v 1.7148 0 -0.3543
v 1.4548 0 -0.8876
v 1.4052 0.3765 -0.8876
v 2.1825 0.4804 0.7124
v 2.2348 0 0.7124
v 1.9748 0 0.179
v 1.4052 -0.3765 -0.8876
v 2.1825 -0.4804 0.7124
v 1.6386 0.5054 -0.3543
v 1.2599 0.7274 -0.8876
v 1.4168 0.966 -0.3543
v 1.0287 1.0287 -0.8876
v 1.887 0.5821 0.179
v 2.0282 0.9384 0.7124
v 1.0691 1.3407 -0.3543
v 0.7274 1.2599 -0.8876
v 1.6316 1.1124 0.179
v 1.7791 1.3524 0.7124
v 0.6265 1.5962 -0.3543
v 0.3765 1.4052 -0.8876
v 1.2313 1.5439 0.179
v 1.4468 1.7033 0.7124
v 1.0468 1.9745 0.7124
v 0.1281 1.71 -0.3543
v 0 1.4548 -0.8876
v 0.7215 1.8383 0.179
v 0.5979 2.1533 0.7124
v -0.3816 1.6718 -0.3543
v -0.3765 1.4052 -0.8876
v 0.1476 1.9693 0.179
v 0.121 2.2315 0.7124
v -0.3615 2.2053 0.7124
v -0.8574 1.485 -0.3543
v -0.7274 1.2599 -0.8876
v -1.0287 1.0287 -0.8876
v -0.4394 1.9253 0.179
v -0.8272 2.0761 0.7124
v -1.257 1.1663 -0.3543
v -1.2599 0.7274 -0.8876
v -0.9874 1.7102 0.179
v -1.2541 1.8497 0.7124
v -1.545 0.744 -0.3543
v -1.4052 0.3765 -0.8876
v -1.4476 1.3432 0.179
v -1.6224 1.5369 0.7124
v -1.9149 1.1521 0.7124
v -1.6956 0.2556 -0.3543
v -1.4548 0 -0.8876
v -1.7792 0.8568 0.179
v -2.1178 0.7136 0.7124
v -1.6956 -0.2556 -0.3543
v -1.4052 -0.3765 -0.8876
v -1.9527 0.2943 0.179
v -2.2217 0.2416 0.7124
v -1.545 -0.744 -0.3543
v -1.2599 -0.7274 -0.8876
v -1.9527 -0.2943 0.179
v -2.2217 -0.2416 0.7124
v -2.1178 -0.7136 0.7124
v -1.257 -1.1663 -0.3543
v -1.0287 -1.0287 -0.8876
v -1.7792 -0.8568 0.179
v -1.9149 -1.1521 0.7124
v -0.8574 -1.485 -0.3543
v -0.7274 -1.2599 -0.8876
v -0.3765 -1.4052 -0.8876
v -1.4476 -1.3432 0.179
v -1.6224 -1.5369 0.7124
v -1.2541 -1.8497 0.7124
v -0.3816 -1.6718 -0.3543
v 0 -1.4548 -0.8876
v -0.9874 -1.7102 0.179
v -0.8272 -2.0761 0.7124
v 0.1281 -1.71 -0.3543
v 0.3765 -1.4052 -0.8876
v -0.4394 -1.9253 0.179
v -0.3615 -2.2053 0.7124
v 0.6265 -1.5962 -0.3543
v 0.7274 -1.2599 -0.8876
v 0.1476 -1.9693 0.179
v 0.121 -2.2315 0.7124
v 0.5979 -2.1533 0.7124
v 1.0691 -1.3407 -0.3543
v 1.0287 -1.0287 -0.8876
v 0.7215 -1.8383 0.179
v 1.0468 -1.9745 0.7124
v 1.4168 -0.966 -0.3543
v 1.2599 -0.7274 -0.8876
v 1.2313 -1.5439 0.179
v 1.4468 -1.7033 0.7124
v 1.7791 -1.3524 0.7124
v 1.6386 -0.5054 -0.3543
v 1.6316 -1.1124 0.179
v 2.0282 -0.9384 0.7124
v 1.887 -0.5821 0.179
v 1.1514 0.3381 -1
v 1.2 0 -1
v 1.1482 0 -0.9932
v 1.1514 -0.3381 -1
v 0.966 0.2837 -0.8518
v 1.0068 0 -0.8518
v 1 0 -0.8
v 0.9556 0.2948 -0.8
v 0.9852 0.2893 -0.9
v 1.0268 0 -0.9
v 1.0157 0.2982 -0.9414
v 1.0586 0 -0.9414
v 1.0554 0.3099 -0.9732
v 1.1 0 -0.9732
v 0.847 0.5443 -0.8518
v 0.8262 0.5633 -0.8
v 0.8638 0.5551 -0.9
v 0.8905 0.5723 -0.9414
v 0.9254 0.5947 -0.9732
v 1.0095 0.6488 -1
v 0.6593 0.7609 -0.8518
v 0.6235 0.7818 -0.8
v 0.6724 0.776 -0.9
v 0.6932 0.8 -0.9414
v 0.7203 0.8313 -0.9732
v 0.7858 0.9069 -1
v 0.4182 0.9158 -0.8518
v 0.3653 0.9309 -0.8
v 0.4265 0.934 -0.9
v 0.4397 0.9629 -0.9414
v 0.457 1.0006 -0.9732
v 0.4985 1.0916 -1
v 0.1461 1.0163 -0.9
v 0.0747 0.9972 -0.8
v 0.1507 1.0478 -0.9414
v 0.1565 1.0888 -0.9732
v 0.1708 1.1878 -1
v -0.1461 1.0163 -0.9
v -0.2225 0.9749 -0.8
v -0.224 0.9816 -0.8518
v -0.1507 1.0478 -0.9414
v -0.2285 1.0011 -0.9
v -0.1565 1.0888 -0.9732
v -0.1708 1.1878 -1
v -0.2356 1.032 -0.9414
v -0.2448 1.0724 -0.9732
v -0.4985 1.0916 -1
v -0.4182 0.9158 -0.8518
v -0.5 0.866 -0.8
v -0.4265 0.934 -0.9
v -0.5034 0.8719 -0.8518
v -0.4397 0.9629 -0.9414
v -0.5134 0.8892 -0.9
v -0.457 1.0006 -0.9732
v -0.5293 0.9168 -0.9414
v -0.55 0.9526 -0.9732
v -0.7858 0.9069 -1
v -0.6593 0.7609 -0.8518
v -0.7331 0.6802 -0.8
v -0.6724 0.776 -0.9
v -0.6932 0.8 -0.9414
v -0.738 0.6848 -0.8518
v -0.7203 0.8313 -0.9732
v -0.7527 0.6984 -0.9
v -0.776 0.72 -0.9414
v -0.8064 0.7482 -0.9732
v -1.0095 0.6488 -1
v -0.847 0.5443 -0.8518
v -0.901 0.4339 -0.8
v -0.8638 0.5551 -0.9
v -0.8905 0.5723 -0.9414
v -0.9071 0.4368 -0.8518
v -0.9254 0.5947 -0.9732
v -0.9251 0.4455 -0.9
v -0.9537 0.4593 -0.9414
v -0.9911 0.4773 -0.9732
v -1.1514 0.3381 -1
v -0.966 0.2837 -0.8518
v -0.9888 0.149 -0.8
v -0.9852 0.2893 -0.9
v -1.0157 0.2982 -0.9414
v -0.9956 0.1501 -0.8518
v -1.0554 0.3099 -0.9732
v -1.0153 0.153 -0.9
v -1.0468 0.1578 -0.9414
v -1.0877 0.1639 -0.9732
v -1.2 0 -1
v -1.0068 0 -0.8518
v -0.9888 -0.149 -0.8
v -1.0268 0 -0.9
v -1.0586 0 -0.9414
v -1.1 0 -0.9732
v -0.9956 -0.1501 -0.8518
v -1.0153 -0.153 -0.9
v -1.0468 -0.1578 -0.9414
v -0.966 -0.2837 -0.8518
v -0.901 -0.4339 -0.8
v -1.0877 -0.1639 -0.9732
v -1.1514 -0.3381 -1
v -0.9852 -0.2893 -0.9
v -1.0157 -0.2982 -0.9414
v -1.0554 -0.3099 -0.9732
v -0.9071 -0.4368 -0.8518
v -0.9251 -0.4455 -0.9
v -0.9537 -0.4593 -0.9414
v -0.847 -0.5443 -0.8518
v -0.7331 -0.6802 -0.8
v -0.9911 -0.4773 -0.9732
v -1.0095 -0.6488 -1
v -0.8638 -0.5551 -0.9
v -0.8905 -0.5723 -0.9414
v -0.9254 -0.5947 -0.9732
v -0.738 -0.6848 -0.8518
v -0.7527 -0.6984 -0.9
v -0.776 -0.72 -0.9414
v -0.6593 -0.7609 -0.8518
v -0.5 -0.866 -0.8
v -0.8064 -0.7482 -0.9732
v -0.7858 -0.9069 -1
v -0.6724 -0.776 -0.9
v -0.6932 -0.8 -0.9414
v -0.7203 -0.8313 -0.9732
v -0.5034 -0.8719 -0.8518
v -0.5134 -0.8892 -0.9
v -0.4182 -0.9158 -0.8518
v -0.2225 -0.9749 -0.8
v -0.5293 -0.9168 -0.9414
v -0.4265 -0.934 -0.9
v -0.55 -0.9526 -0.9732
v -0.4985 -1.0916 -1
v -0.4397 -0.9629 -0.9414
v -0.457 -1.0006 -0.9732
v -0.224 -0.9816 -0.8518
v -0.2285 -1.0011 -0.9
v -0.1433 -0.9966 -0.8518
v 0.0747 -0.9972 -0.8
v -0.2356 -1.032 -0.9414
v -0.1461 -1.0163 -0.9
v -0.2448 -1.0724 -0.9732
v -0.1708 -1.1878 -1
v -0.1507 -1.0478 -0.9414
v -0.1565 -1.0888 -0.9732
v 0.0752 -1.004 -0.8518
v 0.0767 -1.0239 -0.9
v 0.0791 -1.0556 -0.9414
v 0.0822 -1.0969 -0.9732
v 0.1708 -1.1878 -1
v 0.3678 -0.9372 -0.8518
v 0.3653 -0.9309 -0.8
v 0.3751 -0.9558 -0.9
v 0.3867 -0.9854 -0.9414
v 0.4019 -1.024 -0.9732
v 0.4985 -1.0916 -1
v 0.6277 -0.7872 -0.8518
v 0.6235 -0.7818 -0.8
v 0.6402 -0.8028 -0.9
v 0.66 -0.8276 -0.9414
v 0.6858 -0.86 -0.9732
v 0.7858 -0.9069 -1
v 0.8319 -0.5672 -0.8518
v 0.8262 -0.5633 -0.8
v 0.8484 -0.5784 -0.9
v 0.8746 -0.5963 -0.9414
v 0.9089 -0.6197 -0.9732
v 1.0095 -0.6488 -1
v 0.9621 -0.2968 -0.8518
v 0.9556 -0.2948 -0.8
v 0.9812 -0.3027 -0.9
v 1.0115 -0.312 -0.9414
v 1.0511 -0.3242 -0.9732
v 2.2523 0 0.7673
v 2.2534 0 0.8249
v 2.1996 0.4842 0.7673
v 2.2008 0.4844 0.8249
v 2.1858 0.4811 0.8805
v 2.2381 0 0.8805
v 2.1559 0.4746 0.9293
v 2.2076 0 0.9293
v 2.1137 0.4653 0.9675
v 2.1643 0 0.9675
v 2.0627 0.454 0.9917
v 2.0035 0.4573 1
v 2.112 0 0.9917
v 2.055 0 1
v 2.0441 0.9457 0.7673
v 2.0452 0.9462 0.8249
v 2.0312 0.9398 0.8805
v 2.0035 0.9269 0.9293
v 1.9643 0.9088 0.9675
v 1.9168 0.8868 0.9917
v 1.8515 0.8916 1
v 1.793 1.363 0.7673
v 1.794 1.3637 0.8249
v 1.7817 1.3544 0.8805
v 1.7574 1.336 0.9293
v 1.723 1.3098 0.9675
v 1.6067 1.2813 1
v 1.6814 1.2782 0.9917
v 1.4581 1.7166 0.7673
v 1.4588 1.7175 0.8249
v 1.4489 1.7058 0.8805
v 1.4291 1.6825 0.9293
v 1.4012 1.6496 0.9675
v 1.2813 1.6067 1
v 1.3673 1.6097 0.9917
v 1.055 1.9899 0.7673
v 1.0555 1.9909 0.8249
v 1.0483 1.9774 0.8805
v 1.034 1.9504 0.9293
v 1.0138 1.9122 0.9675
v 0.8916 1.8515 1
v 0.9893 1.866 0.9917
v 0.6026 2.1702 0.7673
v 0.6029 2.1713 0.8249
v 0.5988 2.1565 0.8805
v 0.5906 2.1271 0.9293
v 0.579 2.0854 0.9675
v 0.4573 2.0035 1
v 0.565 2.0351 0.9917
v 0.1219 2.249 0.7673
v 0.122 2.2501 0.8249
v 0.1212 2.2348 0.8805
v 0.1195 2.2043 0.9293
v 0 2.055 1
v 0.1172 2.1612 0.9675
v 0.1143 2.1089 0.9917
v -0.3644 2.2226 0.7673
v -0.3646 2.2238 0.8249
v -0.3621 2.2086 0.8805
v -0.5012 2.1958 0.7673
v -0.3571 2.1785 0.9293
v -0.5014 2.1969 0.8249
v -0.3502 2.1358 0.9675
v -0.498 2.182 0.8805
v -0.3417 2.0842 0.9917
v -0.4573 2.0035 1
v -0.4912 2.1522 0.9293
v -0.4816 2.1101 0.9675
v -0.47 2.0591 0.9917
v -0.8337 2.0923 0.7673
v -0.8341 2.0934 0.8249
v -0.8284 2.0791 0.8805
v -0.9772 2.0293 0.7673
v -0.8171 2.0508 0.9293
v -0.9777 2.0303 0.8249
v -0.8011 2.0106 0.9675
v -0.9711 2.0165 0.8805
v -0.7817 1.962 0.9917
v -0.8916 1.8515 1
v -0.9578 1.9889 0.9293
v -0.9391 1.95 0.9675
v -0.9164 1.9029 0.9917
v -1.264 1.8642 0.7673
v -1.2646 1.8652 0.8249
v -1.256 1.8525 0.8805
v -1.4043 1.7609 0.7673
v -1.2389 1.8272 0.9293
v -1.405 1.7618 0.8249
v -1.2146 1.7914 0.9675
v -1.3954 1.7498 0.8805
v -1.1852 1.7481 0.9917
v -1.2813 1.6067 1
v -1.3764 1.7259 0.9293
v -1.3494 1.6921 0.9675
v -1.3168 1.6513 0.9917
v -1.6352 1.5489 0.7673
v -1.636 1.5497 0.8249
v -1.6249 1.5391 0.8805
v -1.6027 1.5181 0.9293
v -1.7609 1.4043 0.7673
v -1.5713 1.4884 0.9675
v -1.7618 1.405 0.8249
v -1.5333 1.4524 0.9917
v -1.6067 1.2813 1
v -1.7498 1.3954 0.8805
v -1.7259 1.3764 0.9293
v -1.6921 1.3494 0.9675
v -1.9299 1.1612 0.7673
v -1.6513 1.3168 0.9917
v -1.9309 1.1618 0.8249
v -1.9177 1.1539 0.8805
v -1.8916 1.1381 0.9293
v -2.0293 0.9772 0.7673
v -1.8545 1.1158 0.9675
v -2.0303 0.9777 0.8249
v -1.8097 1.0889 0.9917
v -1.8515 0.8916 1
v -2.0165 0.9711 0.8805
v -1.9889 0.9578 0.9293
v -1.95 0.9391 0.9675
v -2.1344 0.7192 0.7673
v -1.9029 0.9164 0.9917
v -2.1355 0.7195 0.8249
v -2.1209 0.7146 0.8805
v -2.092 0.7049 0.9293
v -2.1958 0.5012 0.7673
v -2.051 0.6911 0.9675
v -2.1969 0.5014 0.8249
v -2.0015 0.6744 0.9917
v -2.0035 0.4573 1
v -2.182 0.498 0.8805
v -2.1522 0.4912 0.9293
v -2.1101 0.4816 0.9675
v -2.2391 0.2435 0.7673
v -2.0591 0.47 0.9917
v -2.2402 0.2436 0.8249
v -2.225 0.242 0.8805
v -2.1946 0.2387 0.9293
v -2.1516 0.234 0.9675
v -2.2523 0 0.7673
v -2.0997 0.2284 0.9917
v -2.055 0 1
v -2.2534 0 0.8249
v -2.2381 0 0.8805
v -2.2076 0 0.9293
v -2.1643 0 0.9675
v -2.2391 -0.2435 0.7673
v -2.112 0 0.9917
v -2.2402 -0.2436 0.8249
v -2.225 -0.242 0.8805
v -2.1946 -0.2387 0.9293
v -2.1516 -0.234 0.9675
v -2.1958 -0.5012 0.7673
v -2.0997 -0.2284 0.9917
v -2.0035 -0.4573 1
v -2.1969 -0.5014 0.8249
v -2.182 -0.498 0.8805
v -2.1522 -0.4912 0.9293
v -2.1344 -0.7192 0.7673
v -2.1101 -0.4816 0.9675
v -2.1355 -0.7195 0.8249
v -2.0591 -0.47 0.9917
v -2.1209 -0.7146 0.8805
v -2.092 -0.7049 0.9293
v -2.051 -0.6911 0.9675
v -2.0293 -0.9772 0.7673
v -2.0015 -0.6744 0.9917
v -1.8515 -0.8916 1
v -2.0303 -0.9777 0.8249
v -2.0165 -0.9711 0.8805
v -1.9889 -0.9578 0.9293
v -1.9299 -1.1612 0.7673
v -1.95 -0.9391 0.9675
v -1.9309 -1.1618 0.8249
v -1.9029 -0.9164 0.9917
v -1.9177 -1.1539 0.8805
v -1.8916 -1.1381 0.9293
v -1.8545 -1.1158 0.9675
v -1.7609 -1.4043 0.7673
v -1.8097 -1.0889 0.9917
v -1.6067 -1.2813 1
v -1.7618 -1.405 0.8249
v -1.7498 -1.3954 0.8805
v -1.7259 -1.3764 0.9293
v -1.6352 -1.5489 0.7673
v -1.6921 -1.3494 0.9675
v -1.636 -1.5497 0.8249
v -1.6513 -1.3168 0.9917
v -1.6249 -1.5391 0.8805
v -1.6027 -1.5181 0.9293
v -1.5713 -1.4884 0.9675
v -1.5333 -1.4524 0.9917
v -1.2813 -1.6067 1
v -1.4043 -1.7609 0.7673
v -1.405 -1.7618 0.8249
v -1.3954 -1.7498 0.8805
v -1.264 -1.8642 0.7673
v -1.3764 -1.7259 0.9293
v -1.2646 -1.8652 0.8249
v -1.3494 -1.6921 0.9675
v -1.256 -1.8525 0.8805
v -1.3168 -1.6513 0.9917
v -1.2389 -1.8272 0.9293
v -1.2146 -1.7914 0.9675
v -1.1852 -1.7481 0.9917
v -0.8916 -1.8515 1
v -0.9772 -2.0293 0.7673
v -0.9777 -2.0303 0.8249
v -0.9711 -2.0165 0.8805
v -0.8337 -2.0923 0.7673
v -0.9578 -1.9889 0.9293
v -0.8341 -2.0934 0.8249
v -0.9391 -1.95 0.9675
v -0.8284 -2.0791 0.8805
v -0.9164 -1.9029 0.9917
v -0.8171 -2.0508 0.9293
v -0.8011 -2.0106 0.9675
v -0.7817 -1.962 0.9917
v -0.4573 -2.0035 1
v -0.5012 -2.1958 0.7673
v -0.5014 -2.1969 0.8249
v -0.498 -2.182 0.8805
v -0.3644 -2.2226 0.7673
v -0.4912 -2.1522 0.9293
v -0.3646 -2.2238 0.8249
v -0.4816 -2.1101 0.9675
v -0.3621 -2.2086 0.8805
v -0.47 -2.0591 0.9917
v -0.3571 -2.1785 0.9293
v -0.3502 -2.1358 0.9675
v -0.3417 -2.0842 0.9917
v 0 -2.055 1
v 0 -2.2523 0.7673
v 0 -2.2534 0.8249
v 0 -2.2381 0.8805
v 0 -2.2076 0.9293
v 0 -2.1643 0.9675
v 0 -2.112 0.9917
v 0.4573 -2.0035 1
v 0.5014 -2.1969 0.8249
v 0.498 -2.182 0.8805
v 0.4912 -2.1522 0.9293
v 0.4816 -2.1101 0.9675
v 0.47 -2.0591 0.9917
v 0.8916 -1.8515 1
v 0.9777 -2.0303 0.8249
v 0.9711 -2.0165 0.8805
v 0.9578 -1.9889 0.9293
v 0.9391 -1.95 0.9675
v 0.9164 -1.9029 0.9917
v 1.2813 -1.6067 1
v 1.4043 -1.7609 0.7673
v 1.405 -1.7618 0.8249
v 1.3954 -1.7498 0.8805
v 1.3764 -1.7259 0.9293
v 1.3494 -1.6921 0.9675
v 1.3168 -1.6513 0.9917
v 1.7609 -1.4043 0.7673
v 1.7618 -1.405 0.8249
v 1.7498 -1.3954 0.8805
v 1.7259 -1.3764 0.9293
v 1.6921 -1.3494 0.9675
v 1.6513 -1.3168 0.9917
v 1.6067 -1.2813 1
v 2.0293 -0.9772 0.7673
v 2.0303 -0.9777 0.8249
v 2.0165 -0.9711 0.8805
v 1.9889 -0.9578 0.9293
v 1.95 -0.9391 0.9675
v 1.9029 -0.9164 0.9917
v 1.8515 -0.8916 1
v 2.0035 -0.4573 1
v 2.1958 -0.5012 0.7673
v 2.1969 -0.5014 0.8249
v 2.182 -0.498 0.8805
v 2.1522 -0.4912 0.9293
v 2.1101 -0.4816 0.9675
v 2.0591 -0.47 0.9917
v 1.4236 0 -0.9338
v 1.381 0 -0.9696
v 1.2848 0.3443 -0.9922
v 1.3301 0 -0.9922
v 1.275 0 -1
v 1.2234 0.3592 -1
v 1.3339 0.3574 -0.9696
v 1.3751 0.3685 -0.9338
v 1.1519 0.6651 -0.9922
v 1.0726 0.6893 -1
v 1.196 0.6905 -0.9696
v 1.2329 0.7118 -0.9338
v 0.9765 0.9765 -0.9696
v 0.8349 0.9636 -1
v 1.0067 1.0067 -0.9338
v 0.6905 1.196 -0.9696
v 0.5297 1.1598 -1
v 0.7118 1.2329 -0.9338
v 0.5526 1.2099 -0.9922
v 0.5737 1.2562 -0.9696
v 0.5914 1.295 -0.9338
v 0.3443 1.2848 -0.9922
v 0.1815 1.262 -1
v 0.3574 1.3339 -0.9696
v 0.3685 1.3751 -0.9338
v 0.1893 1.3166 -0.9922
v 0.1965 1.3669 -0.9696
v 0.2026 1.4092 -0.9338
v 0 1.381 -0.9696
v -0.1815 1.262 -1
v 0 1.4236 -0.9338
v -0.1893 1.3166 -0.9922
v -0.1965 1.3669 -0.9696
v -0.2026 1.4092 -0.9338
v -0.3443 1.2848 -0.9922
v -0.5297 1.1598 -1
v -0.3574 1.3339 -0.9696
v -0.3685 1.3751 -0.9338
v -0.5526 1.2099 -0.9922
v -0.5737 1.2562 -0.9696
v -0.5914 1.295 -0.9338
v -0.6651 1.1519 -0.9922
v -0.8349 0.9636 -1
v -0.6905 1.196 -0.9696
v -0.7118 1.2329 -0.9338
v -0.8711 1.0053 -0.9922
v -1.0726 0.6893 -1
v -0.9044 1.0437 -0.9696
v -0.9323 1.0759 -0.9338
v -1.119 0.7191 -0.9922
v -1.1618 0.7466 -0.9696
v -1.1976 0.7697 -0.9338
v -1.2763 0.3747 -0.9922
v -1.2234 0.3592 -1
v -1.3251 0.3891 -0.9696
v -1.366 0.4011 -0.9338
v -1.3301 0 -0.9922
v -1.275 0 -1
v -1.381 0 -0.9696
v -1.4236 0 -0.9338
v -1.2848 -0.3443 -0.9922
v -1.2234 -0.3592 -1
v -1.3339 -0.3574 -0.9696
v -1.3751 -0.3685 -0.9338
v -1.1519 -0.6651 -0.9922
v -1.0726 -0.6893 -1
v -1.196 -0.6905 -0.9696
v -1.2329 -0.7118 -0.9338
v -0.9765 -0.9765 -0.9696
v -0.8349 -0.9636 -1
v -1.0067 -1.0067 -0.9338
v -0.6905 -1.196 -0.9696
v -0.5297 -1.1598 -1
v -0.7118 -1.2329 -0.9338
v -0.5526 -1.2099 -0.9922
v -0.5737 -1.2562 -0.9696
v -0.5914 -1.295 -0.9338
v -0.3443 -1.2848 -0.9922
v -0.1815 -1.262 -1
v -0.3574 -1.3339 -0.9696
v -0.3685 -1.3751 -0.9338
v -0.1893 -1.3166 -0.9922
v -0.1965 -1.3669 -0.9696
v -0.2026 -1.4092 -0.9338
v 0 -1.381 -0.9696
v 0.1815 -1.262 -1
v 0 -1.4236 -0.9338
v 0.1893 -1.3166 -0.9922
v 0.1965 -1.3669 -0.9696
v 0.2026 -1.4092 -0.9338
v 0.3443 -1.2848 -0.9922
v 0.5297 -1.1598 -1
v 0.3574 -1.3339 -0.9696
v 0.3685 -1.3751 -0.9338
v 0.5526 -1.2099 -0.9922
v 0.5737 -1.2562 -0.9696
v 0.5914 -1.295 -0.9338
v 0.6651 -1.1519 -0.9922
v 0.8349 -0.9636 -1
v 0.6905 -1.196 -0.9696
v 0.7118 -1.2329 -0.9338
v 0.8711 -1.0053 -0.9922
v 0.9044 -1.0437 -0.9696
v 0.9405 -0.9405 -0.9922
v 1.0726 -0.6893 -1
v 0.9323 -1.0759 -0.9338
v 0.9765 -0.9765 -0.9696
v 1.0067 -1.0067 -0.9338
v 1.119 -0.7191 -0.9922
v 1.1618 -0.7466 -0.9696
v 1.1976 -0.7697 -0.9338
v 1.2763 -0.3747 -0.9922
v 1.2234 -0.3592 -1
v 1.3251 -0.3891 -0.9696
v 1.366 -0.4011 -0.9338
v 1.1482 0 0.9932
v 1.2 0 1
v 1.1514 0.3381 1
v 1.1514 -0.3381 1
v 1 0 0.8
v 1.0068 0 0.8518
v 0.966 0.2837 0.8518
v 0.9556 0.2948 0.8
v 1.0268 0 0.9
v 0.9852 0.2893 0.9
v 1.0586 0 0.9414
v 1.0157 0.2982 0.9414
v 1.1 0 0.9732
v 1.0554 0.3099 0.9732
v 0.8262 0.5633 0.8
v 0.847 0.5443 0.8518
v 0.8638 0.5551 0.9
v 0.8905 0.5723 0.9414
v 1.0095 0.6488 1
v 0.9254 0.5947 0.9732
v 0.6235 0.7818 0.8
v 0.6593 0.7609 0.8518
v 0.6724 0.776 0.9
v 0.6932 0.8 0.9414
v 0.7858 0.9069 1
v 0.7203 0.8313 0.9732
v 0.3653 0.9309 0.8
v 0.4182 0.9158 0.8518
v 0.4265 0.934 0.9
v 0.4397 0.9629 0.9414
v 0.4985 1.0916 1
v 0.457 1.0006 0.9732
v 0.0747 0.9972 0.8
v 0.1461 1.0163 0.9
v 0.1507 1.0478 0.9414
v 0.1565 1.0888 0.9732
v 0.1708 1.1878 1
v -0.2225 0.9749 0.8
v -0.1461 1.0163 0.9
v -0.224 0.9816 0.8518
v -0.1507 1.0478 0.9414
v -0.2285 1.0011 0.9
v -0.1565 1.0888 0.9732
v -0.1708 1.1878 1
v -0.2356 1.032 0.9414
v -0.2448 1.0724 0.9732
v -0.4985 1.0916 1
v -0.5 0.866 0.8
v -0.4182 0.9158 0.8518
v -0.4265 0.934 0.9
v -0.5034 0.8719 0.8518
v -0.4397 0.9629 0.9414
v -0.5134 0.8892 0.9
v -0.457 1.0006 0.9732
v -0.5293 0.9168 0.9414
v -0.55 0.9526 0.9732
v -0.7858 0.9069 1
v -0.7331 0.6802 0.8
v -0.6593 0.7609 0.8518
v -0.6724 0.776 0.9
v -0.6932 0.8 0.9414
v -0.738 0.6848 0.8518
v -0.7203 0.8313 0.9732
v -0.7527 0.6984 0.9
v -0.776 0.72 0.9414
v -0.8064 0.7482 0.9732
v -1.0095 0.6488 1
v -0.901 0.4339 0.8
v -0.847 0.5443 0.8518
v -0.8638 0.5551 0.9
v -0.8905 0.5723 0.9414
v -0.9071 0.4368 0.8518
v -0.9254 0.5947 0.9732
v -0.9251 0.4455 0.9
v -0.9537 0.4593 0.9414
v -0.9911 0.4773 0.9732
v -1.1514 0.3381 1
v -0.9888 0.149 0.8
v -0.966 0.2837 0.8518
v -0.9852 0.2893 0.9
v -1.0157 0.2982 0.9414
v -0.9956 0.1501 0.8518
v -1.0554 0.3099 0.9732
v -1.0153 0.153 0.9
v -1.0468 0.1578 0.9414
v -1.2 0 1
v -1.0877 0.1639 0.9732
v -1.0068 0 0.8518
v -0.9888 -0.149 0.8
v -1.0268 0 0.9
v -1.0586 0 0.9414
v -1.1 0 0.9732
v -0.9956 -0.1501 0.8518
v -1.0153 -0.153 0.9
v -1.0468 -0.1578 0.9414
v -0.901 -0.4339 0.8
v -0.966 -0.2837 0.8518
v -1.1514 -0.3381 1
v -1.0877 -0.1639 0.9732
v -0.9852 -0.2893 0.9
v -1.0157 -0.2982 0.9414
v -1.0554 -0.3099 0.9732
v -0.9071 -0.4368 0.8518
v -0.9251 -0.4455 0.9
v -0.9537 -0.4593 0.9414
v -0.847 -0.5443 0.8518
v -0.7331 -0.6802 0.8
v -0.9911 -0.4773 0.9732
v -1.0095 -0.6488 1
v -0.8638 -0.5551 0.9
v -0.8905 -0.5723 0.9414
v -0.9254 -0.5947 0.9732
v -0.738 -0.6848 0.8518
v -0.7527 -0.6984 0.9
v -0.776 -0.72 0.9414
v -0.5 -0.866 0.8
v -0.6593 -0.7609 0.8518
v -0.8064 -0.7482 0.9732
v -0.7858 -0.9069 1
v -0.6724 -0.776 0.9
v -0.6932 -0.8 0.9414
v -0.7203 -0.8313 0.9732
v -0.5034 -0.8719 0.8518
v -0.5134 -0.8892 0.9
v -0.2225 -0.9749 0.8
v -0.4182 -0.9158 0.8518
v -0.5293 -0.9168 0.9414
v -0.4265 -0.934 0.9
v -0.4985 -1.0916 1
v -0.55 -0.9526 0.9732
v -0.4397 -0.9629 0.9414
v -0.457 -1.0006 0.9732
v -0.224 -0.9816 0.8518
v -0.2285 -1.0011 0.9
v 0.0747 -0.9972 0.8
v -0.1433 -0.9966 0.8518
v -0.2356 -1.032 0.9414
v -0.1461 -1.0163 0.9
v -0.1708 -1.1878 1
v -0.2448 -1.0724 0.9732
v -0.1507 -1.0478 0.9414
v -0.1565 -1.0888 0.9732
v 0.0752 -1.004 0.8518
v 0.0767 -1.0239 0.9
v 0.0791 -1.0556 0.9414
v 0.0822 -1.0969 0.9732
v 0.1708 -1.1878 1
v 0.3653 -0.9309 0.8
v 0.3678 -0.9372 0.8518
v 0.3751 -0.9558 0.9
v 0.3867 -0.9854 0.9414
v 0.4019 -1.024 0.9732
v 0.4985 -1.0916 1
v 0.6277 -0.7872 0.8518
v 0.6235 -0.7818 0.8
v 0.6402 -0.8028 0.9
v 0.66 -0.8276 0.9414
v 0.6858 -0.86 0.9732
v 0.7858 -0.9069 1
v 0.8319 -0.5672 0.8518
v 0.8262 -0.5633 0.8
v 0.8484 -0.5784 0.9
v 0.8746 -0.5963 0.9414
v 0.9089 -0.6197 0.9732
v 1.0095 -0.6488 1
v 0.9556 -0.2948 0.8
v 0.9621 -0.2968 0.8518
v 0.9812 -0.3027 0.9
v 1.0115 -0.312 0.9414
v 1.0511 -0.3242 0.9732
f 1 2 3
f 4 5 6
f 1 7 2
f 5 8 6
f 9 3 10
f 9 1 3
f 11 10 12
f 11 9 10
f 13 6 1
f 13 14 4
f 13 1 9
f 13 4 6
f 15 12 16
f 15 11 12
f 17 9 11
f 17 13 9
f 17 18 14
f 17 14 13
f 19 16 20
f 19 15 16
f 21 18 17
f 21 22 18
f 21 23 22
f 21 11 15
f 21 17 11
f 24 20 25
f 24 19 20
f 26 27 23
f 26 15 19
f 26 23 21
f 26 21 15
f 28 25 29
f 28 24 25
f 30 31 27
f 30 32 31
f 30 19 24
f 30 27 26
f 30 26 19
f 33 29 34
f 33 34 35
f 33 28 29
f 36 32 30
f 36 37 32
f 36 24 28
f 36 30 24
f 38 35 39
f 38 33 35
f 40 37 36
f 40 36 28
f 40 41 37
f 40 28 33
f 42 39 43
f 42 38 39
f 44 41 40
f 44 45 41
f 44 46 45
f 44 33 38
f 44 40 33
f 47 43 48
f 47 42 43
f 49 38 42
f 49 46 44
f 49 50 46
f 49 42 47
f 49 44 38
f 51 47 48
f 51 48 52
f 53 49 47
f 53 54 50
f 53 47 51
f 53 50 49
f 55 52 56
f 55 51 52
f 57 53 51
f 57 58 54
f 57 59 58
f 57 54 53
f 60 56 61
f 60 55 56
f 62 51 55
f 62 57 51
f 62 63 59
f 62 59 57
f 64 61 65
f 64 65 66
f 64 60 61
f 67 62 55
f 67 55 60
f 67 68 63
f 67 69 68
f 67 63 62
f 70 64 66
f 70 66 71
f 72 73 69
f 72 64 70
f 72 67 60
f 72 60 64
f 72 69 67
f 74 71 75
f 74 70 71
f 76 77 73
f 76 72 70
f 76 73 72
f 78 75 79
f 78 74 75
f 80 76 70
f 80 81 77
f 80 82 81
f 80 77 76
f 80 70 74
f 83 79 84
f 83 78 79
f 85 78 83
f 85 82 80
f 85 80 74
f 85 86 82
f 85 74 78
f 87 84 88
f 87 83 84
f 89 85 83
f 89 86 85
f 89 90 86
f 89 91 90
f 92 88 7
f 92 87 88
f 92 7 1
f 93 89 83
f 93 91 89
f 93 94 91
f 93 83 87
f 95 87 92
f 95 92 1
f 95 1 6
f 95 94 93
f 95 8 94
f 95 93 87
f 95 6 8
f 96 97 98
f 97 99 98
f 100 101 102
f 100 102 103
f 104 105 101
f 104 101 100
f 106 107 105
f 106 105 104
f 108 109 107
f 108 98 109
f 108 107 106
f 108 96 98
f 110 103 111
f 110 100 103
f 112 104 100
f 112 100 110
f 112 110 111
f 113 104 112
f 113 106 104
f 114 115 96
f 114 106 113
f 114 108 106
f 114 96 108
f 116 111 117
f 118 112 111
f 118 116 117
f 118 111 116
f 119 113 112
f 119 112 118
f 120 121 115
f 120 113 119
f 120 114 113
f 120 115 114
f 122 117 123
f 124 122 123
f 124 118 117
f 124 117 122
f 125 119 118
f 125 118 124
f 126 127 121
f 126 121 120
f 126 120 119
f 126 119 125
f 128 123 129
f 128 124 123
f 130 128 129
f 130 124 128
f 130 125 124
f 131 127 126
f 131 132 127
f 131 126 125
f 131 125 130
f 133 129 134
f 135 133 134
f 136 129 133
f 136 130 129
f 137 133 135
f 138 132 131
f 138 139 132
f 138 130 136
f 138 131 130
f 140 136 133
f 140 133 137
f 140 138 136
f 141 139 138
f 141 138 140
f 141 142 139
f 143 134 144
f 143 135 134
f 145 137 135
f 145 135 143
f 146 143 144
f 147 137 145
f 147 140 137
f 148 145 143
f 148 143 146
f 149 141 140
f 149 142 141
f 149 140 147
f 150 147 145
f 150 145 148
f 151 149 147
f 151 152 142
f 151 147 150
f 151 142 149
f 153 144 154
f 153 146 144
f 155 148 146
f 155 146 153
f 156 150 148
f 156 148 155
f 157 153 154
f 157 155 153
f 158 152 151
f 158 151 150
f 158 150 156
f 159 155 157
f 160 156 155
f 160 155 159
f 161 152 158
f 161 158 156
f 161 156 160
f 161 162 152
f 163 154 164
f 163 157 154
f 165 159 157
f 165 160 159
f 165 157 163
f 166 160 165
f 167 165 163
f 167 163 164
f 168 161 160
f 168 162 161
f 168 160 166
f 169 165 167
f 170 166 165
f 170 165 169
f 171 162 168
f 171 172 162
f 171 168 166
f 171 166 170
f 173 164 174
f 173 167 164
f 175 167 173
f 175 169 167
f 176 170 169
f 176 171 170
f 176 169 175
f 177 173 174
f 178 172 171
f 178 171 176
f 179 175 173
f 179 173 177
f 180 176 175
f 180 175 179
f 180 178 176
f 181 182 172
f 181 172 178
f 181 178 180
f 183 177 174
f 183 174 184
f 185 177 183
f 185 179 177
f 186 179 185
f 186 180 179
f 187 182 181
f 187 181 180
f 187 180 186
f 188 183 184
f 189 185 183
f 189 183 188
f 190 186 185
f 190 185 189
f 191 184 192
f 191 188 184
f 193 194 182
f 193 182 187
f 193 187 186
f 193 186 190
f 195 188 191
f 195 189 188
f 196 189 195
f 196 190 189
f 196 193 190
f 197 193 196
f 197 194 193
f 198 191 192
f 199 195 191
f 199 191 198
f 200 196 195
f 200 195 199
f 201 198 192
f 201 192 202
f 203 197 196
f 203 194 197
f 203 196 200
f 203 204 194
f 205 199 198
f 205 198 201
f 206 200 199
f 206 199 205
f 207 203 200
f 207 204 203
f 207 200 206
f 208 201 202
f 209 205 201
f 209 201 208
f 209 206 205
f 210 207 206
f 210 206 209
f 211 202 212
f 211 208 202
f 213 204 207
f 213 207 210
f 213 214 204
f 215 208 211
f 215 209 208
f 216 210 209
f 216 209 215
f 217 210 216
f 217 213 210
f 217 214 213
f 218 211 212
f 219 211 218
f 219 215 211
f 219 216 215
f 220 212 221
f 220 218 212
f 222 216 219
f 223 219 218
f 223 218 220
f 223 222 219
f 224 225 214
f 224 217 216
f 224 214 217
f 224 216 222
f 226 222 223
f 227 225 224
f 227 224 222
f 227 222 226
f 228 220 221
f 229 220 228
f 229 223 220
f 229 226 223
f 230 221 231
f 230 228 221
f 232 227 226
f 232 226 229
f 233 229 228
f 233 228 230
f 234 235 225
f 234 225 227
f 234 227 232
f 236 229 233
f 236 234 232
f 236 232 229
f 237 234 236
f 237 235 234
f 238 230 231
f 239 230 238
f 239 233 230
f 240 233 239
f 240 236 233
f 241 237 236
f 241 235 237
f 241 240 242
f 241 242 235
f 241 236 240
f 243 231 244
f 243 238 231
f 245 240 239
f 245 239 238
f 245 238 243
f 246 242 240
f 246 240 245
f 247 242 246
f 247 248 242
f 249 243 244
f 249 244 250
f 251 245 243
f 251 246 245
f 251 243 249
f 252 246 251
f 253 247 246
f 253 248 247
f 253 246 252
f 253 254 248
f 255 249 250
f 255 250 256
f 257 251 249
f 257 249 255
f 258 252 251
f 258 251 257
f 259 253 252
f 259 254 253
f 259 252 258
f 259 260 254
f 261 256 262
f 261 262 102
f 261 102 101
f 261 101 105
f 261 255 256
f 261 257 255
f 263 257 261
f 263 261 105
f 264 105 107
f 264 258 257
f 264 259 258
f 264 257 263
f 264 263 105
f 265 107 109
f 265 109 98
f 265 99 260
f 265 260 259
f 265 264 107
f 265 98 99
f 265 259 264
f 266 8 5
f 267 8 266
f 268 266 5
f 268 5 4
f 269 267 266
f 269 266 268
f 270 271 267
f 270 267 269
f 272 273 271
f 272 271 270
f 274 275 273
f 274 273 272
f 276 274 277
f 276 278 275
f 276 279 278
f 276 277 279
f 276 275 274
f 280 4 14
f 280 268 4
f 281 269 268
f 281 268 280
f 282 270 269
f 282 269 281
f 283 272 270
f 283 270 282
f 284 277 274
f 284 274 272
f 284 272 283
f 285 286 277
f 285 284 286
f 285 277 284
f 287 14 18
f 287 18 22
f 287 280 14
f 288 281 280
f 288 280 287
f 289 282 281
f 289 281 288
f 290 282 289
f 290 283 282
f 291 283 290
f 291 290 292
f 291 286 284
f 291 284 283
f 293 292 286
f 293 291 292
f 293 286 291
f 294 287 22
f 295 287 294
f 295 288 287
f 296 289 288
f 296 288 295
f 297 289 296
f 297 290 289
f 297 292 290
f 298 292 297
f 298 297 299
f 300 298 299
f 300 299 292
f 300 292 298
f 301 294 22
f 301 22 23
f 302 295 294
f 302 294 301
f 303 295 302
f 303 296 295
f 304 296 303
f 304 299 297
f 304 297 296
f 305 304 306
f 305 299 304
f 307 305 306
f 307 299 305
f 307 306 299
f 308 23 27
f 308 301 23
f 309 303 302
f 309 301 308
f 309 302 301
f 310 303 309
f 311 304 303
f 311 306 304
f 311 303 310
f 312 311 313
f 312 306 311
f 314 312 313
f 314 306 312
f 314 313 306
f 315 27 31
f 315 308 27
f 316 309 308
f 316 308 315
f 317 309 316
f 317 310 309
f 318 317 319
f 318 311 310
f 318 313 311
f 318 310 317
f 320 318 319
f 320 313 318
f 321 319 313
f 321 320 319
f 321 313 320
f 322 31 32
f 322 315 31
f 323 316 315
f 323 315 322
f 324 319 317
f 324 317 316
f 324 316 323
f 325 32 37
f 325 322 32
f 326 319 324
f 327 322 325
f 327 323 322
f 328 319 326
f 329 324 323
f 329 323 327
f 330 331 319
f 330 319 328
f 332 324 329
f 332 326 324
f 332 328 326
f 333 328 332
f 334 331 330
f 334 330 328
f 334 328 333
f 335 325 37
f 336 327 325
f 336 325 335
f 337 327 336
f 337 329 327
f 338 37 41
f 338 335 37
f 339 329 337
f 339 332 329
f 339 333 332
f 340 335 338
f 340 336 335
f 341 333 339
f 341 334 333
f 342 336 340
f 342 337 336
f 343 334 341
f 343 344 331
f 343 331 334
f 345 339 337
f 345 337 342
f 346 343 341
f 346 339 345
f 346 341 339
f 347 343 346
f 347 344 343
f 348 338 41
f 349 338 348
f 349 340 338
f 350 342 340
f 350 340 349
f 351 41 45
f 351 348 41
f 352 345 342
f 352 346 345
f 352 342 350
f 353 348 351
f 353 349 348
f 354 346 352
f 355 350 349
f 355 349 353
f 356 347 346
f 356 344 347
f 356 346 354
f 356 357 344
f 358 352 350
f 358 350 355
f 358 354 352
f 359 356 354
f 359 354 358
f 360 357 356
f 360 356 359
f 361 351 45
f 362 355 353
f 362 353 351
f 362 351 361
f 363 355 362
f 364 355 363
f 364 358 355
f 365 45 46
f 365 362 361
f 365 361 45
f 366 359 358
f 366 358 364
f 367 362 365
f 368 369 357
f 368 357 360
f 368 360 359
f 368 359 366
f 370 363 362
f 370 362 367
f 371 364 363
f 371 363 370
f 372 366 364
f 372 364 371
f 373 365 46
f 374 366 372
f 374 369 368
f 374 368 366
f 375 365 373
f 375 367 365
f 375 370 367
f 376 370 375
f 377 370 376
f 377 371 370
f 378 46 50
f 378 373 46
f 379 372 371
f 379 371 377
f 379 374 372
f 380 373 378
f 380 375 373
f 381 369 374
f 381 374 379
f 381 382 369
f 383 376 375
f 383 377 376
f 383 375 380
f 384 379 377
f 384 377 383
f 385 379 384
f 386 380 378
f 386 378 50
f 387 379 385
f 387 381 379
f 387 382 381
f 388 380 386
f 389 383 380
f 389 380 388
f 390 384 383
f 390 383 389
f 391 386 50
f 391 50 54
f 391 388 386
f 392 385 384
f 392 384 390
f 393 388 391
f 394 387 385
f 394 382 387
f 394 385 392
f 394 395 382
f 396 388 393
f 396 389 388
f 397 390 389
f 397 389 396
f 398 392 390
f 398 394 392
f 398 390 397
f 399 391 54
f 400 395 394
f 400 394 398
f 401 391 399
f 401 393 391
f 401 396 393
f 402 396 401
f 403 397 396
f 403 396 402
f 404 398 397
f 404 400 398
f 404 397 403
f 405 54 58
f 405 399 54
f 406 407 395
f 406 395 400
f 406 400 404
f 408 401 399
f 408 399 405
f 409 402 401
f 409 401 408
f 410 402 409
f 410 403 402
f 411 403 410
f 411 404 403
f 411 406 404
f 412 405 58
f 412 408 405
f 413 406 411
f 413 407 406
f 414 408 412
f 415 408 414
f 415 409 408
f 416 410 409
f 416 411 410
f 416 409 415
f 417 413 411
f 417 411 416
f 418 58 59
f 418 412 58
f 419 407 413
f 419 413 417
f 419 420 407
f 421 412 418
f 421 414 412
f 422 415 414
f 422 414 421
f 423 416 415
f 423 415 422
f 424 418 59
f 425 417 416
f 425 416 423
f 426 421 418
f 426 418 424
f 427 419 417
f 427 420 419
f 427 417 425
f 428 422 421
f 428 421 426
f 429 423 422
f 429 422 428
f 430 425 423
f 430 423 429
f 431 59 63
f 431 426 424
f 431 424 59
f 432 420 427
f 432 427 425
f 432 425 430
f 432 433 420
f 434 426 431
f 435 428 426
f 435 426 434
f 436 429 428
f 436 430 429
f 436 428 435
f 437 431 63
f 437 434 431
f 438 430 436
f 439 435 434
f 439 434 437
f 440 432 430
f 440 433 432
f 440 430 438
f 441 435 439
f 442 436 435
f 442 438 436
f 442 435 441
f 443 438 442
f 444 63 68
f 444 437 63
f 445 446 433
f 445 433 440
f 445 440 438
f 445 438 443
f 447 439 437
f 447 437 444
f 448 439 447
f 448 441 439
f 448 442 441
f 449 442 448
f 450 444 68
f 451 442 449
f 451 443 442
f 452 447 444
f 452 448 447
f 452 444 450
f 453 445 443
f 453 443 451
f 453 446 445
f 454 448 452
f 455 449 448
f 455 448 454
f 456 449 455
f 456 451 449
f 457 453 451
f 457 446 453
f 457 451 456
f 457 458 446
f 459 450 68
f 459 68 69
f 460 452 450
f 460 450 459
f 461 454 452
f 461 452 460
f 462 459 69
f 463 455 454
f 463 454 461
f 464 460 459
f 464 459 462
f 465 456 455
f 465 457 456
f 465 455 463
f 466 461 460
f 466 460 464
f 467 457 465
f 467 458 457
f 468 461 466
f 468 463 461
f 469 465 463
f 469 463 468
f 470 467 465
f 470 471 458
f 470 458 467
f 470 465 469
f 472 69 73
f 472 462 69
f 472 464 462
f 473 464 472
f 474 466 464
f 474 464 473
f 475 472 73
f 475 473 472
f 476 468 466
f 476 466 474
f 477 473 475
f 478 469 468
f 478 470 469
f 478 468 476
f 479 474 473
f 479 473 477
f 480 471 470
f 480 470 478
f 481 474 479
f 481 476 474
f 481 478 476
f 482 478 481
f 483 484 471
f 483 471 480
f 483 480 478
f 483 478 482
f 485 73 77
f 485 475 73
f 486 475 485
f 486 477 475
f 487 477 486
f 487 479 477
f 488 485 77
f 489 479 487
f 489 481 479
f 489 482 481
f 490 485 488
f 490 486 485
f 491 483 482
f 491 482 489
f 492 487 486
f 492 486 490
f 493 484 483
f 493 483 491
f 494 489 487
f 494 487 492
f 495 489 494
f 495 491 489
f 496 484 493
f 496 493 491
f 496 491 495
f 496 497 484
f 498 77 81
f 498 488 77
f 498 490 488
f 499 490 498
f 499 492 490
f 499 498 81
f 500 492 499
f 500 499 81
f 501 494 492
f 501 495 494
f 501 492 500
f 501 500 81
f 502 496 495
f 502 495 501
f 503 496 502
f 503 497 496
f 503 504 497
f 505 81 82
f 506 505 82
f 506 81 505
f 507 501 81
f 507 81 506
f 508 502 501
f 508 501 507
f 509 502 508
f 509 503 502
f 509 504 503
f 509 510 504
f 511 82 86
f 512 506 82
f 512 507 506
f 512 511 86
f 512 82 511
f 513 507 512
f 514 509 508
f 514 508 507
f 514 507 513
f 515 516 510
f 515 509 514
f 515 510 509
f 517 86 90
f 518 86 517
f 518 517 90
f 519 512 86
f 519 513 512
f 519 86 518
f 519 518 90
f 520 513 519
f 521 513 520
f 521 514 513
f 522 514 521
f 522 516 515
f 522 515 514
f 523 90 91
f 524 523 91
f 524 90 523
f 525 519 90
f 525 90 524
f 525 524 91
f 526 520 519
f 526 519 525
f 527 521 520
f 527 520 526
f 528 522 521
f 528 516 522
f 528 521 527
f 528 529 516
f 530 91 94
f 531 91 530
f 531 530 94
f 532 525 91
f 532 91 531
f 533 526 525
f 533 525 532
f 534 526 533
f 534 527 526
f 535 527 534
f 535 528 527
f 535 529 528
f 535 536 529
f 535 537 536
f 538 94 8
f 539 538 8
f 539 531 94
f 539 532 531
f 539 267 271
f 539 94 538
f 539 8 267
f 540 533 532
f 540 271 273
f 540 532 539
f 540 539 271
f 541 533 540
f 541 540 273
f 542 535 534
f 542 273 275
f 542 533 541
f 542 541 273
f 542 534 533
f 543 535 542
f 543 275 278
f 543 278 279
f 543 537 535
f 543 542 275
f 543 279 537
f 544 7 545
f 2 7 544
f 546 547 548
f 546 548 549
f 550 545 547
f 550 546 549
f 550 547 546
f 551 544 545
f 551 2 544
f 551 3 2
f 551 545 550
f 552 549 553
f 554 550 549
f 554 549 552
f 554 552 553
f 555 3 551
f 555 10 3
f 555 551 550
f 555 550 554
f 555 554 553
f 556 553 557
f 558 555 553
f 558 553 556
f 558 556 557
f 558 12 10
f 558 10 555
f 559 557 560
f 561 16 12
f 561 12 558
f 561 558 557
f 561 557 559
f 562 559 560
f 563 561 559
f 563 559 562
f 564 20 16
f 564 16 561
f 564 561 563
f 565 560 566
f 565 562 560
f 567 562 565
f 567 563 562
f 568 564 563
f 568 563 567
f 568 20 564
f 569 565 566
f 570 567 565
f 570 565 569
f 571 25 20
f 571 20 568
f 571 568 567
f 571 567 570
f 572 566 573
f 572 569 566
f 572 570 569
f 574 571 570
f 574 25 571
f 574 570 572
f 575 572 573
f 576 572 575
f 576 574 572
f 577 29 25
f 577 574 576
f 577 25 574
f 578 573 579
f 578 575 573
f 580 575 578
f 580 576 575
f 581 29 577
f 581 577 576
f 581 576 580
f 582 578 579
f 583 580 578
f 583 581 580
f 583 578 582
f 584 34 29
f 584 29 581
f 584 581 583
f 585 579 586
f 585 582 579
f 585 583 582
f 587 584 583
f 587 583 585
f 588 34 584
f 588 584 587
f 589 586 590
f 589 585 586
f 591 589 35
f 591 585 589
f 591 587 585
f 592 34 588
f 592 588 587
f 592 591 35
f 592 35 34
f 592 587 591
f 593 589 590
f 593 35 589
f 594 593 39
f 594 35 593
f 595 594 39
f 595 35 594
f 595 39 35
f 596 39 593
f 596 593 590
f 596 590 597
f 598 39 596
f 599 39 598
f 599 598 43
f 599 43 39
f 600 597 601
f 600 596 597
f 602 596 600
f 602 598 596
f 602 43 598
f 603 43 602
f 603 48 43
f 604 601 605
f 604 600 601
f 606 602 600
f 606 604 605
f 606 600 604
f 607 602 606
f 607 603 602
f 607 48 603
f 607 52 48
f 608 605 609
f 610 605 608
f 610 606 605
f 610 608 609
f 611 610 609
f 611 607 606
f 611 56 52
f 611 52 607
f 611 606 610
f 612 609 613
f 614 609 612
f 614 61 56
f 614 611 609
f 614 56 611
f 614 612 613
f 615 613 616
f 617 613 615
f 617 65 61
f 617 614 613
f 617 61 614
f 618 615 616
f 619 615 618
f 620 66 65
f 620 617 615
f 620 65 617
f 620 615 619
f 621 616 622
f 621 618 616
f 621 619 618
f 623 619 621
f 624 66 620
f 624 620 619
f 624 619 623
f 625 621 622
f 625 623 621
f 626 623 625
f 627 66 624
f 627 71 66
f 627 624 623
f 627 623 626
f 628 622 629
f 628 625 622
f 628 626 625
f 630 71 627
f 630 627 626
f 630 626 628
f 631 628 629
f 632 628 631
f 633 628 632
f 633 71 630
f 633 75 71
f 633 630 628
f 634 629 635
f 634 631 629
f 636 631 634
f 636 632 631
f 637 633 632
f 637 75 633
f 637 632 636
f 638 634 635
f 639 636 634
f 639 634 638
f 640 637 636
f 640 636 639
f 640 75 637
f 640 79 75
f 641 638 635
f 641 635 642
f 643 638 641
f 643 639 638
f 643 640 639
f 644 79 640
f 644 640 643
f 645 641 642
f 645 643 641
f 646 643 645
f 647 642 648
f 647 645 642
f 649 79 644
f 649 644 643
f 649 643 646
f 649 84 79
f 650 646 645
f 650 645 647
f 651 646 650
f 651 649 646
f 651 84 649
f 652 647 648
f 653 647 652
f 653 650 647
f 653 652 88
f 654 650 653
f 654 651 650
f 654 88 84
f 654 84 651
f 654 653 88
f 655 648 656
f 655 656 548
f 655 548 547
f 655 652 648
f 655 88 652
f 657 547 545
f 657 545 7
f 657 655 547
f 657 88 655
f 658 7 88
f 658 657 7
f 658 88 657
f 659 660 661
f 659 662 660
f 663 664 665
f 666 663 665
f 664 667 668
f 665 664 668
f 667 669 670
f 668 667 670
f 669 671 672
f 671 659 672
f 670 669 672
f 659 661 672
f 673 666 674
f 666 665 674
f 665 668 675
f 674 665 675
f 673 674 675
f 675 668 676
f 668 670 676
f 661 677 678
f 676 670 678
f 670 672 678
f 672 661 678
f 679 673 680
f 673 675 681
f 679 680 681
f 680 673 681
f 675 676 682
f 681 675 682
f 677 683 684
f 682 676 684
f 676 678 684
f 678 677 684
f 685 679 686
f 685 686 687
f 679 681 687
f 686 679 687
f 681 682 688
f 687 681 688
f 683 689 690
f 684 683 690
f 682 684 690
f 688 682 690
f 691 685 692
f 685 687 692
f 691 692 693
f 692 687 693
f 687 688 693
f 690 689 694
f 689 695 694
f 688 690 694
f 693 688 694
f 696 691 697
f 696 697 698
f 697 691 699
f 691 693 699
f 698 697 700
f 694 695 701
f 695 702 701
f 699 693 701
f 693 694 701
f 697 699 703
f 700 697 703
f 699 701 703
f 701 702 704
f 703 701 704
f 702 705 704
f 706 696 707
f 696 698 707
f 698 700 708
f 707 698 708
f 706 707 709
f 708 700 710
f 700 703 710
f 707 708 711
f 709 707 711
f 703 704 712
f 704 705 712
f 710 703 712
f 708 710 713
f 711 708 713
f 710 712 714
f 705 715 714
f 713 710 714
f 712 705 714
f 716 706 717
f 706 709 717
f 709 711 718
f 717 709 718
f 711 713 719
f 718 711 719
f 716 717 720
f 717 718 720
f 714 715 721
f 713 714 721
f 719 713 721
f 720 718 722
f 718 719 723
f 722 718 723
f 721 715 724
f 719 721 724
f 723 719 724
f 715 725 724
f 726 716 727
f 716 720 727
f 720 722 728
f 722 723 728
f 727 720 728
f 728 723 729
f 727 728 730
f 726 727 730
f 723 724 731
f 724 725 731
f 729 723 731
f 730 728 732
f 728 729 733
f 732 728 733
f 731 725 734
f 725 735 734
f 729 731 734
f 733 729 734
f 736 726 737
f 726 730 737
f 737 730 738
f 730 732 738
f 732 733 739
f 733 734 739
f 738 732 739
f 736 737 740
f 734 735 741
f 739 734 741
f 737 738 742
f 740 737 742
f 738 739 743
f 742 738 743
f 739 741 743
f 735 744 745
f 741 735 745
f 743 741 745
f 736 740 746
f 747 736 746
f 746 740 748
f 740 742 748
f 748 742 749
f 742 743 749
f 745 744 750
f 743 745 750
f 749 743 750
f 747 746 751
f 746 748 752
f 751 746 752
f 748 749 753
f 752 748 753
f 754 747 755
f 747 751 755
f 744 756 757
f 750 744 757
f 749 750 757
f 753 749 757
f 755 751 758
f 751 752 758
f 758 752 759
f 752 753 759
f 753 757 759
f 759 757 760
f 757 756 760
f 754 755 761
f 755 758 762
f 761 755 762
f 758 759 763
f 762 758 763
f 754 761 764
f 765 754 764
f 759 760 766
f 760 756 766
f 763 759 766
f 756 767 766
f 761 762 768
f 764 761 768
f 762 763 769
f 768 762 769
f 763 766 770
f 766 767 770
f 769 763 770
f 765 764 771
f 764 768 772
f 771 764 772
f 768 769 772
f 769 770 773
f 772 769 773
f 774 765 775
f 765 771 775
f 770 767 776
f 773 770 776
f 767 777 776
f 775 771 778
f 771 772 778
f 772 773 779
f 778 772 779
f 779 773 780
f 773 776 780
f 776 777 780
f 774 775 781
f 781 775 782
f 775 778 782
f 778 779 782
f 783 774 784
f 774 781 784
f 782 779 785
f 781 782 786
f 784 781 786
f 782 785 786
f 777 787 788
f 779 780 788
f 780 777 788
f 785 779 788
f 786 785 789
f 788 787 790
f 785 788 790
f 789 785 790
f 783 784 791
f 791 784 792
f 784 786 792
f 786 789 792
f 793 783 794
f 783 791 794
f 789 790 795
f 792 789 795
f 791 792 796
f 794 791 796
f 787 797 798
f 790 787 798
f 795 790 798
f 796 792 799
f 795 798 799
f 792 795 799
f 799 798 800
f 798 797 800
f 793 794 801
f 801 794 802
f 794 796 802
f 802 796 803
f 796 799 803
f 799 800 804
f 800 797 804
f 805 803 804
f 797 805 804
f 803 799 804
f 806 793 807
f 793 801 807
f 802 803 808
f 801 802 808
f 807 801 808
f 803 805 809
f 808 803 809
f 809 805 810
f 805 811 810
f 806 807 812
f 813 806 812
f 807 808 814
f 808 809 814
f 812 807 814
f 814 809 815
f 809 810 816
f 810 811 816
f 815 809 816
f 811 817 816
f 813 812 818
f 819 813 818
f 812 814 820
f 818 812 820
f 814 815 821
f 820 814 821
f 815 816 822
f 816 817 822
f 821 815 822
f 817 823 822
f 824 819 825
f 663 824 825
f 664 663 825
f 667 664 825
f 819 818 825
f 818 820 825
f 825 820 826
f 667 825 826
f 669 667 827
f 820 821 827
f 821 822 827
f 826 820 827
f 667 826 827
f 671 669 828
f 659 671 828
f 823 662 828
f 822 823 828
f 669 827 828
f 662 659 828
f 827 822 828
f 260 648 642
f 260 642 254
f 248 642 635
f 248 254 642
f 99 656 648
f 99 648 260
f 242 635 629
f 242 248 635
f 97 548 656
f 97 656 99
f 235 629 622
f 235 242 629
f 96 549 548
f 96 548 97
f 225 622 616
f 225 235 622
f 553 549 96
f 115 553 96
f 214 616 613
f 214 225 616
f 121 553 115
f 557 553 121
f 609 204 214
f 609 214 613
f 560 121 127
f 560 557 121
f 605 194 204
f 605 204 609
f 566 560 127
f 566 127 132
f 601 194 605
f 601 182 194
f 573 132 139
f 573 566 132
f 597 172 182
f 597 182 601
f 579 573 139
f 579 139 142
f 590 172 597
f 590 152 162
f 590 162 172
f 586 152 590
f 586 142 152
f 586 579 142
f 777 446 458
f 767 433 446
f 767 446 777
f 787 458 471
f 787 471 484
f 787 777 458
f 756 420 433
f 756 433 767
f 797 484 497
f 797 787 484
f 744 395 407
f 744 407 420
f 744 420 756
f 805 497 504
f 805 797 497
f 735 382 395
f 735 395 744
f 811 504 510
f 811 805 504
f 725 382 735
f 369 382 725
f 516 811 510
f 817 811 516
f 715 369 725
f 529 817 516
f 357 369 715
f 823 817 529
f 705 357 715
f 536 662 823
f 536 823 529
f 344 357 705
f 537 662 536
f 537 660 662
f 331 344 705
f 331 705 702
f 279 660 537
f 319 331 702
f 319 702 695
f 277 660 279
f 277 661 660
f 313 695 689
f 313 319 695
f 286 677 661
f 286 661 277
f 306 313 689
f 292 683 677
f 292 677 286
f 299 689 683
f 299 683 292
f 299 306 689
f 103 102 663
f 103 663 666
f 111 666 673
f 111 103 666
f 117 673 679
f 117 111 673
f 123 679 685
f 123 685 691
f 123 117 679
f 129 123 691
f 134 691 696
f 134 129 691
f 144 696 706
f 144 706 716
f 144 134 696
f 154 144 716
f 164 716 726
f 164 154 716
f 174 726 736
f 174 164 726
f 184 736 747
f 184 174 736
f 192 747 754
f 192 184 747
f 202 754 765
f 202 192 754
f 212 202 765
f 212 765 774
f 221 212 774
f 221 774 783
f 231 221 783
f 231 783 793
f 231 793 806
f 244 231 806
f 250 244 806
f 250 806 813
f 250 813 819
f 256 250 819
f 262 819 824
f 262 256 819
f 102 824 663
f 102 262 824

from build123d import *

# Parameters (mm, degrees)
FILLET_R = 0.2


with BuildPart() as part:
    # Sketch → Revolution (revolve)
    with BuildSketch(Plane.XZ):
        Polygon((1, 1), (1, -1), (1.4, -1), (2.375, 1), align=None)
    revolve(axis=Axis((0, 0, 0), (0, 0, 1)))

    # Fillet
    fillet_edges = [part.edges().sort_by_distance(p)[0] for p in [
        (-1, 0, 1),
        (-2.375, 0, 1),
        (-1.4, 0, -1),
        (-1, 0, -1),
    ]]
    fillet(fillet_edges, radius=FILLET_R)


solid = part.part
